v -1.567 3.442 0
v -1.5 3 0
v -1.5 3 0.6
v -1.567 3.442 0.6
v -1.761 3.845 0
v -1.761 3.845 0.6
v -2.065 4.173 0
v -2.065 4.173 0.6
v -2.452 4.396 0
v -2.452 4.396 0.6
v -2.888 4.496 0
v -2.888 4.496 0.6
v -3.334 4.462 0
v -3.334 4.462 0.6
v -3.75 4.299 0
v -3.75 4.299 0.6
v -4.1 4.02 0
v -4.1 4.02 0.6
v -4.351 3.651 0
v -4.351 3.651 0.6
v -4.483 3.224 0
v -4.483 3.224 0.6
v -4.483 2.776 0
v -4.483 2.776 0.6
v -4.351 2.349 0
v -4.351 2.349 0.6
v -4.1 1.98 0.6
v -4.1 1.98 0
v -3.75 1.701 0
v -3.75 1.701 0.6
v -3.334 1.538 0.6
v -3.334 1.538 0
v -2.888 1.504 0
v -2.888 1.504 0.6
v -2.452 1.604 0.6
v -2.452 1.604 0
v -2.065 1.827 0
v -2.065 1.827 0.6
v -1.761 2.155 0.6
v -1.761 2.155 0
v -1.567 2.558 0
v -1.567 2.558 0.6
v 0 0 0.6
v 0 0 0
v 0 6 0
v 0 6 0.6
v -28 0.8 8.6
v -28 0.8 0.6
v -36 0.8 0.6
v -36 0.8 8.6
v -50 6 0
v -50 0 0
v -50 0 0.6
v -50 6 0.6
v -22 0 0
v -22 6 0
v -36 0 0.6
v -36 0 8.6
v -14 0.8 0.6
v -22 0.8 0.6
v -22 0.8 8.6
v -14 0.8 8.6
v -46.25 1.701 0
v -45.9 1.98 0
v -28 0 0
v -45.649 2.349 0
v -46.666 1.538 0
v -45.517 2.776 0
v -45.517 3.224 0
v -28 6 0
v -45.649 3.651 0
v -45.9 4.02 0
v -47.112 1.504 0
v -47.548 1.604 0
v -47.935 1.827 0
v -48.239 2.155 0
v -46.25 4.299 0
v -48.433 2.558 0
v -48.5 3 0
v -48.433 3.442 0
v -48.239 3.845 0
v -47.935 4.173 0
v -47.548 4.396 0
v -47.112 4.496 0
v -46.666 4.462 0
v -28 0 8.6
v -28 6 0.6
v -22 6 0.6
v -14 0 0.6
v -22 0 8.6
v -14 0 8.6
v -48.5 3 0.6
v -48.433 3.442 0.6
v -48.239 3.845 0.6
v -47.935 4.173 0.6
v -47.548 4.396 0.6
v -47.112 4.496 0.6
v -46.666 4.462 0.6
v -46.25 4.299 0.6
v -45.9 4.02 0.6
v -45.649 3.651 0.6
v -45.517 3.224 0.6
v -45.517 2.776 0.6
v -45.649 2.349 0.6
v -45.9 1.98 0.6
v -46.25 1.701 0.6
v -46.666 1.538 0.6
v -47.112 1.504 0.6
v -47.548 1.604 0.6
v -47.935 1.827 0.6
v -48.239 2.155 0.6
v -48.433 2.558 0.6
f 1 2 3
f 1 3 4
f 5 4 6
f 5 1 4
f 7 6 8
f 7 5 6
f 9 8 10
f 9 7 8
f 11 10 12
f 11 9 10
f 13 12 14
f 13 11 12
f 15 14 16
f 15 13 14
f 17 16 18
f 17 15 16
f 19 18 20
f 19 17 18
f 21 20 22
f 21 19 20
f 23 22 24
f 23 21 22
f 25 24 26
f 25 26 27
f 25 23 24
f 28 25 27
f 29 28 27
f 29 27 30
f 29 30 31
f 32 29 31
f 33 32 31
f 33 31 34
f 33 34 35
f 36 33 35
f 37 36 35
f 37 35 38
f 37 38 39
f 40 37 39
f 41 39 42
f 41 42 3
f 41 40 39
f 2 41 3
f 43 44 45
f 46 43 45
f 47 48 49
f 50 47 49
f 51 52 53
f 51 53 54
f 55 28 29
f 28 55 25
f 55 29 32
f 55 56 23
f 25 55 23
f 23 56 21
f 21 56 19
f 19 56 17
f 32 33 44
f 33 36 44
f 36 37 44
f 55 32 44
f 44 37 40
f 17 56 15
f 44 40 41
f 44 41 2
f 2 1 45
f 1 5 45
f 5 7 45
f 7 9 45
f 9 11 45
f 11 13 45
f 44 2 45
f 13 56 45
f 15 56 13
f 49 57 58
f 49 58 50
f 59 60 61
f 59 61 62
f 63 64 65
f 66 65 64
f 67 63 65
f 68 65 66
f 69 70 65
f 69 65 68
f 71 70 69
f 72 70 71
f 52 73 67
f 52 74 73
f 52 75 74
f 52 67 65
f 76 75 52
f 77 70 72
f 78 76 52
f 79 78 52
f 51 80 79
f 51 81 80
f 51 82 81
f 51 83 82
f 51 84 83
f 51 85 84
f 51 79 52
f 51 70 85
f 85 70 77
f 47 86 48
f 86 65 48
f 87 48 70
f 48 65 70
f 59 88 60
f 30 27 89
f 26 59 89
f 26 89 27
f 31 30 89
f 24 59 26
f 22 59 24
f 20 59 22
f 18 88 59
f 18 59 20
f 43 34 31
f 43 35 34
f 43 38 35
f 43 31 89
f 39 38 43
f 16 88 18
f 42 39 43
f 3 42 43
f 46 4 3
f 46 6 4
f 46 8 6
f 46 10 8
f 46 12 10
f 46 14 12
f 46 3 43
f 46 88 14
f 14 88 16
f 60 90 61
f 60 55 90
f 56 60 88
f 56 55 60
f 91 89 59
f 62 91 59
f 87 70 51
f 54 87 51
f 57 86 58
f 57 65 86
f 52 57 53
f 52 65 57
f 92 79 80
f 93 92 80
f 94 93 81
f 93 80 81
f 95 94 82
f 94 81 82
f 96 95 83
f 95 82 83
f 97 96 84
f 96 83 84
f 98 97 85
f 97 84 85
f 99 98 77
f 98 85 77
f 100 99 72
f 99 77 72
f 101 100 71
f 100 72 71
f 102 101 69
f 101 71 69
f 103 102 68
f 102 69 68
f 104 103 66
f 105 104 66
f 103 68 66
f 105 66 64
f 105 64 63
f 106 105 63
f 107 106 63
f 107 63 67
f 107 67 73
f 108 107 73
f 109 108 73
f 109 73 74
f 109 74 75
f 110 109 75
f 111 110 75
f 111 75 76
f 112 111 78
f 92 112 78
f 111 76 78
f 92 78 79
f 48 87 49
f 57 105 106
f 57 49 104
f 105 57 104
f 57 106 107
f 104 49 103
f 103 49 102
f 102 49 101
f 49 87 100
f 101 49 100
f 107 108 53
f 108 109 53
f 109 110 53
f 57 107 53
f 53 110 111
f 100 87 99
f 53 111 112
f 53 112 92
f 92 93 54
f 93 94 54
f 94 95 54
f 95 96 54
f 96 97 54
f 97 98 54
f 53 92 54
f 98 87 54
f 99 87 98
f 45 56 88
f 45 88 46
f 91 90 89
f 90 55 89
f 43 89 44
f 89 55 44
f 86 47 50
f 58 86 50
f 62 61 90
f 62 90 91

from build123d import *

# Parameters (mm, degrees)
F0_W     = 22
F0_H     = 6
F0_R     = 1.5
F1_DEPTH = 0.6
F2_W     = 8
F2_H     = 0.8
F3_DEPTH = 8


with BuildPart() as f1:
    # F0 (on Top) → F1 (new body)
    with BuildSketch(Plane.XY):
        with Locations((-11, 3)):
            Rectangle(F0_W, F0_H)
        with Locations((-3, 3)):
            Circle(F0_R, mode=Mode.SUBTRACT)
    extrude(amount=F1_DEPTH)

    # F2 (on face) → F3 (join)
    with BuildSketch(Plane.XY.offset(0.6)):
        with Locations((-18, 0.4)):
            Rectangle(F2_W, F2_H)
    extrude(amount=F3_DEPTH)


with BuildPart() as f5_1:
    # F5: instance of F1
    add(f1.part.mirror(Plane.YZ.offset(-25)))


solid = Compound([f1.part, f5_1.part])
